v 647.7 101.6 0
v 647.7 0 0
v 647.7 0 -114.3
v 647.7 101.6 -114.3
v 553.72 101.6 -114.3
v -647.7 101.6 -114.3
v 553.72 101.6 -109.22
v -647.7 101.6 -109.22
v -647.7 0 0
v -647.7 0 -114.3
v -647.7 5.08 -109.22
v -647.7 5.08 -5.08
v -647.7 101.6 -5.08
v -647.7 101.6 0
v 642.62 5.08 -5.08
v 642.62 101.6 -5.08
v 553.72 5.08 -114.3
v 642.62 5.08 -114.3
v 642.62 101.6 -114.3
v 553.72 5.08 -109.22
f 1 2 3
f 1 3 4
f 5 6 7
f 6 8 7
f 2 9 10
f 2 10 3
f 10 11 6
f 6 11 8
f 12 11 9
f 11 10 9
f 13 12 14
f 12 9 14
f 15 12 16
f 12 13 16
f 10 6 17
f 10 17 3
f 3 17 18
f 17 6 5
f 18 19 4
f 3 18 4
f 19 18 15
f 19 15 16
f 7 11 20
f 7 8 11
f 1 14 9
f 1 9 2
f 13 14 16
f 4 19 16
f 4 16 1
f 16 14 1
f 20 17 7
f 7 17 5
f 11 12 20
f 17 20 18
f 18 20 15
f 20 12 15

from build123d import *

# Parameters (mm, degrees)
SKETCH1_W           = 1295.4
SKETCH1_H           = 101.6
BOSS_EXTRUDE1_DEPTH = 114.3
SHELL1_T            = -5.08
SKETCH3_W           = 88.9
SKETCH3_H           = 96.52
CUT_EXTRUDE1_DEPTH  = 5.08


with BuildPart() as part:
    # Sketch1 → Boss-Extrude1 (new body)
    with BuildSketch(Plane.XY):
        with Locations((0, 50.8)):
            Rectangle(SKETCH1_W, SKETCH1_H)
    extrude(amount=-BOSS_EXTRUDE1_DEPTH)

    # Shell1
    shell1_openings = [part.faces().sort_by_distance(p)[0] for p in [
        (-647.7, 50.8, -57.15),
        (0, 101.6, -57.15),
    ]]
    offset(amount=SHELL1_T, openings=shell1_openings, kind=Kind.INTERSECTION)

    # Sketch3 → Cut-Extrude1 (cut)
    with BuildSketch(Plane(origin=(0, 0, -114.3), x_dir=(-1, 0, 0), z_dir=(0, 0, -1))):
        with Locations((-598.17, 53.34)):
            Rectangle(SKETCH3_W, SKETCH3_H)
    extrude(amount=-CUT_EXTRUDE1_DEPTH, mode=Mode.SUBTRACT)


solid = part.part
